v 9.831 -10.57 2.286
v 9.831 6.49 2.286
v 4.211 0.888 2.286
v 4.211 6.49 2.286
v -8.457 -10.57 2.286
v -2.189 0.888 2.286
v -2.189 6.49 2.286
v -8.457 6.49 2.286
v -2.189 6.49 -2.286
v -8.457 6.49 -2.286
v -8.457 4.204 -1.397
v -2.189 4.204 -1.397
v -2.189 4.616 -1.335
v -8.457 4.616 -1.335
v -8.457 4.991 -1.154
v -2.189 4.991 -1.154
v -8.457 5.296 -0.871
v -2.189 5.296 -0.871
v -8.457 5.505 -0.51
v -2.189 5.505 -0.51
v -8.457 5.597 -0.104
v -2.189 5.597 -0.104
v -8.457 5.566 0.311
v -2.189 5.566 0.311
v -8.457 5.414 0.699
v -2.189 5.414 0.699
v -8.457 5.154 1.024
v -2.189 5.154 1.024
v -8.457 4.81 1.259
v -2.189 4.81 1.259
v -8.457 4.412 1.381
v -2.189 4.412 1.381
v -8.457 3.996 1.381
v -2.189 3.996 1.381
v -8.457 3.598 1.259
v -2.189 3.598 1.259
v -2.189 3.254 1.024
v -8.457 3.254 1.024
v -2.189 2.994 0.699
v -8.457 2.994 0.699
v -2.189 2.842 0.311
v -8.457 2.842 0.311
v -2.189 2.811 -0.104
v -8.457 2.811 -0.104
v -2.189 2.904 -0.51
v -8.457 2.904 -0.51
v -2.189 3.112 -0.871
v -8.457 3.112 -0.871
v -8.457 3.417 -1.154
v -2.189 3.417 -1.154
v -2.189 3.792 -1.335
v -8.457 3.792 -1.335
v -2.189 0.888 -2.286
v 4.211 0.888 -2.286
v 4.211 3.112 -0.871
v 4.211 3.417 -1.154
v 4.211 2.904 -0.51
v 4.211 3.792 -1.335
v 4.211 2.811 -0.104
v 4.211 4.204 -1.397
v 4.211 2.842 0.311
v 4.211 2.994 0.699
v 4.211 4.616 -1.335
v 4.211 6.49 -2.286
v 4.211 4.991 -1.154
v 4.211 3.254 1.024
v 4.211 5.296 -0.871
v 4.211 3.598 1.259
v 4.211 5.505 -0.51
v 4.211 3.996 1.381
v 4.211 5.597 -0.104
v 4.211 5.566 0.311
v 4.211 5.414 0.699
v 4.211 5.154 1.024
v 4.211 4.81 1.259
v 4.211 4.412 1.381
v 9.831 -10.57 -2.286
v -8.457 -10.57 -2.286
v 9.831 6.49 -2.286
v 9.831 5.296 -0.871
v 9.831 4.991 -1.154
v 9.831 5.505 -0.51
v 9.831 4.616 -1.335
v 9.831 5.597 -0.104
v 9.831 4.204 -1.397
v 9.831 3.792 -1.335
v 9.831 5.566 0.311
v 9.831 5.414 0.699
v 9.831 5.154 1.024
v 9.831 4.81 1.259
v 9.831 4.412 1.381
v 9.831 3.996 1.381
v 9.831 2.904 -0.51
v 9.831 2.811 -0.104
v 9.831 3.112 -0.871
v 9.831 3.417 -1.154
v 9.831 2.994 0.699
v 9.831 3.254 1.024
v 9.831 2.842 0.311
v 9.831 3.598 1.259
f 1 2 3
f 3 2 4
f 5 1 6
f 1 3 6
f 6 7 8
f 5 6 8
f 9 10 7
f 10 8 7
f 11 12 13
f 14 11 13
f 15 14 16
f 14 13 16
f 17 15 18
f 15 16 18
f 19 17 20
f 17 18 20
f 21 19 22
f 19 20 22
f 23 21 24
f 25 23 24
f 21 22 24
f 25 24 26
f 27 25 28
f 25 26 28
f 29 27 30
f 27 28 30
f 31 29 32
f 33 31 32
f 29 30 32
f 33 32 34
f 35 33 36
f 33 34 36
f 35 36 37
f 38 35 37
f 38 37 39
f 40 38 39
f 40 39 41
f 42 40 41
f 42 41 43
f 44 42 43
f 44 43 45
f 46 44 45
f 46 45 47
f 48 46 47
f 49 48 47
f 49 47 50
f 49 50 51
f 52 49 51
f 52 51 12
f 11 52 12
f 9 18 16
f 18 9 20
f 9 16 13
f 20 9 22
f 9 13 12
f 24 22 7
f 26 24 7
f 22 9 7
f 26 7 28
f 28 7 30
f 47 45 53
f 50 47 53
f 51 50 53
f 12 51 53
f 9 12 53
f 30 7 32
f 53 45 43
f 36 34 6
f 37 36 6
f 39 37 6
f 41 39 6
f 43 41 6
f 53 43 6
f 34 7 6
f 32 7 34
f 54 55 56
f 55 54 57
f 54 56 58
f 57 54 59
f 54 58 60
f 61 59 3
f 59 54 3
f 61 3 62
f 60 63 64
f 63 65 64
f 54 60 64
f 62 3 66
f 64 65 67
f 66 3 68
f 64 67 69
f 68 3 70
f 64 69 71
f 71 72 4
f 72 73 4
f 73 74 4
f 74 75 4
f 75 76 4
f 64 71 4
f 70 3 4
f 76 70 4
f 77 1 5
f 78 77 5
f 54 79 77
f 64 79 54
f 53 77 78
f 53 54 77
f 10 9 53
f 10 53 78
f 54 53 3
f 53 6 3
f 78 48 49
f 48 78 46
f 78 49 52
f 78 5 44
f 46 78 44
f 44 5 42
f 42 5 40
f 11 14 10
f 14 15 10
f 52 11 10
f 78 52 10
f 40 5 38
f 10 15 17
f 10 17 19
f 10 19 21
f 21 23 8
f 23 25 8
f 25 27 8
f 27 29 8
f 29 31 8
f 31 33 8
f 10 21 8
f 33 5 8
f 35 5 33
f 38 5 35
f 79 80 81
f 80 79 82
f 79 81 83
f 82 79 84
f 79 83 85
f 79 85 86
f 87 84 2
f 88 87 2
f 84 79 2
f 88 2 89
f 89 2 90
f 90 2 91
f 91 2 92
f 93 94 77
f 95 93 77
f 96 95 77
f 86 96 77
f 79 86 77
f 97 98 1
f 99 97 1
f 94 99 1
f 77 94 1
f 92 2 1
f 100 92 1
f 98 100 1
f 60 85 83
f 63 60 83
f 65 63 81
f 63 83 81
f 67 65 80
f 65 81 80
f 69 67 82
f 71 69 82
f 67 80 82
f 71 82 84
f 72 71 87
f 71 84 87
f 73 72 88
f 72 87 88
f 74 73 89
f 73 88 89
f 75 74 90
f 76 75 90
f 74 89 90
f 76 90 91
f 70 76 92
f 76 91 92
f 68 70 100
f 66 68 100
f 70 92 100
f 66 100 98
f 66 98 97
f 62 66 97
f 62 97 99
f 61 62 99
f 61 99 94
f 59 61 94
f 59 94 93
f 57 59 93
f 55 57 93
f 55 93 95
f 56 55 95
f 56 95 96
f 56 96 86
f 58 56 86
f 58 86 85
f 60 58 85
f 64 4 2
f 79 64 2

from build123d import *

# Parameters (mm, degrees)
BOSS_EXTRUDE1_DEPTH = 2.286
SKETCH3_R           = 1.397
CUT_EXTRUDE1_DEPTH  = 19.288


with BuildPart() as part:
    # Sketch1 → Boss-Extrude1 (new body, symmetric)
    with BuildSketch(Plane.XY):
        Polygon((9.83079784, -10.569522716), (-8.45720216, -10.569522716), (-8.45720216, 6.49008613), (-2.188628559, 6.49008613), (-2.188628559, 0.887867874), (4.211173098, 0.887867874), (4.211173098, 6.49008613), (9.83079784, 6.49008613), align=None)
    extrude(amount=BOSS_EXTRUDE1_DEPTH, both=True)

    # Sketch3 → Cut-Extrude1 (cut, through all)
    with BuildSketch(Plane(origin=(9.83079784, 0, 0), x_dir=(0, 0, -1), z_dir=(1, 0, 0))):
        with Locations((0, 4.20408613)):
            Circle(SKETCH3_R)
    extrude(amount=-CUT_EXTRUDE1_DEPTH, mode=Mode.SUBTRACT)


solid = part.part
